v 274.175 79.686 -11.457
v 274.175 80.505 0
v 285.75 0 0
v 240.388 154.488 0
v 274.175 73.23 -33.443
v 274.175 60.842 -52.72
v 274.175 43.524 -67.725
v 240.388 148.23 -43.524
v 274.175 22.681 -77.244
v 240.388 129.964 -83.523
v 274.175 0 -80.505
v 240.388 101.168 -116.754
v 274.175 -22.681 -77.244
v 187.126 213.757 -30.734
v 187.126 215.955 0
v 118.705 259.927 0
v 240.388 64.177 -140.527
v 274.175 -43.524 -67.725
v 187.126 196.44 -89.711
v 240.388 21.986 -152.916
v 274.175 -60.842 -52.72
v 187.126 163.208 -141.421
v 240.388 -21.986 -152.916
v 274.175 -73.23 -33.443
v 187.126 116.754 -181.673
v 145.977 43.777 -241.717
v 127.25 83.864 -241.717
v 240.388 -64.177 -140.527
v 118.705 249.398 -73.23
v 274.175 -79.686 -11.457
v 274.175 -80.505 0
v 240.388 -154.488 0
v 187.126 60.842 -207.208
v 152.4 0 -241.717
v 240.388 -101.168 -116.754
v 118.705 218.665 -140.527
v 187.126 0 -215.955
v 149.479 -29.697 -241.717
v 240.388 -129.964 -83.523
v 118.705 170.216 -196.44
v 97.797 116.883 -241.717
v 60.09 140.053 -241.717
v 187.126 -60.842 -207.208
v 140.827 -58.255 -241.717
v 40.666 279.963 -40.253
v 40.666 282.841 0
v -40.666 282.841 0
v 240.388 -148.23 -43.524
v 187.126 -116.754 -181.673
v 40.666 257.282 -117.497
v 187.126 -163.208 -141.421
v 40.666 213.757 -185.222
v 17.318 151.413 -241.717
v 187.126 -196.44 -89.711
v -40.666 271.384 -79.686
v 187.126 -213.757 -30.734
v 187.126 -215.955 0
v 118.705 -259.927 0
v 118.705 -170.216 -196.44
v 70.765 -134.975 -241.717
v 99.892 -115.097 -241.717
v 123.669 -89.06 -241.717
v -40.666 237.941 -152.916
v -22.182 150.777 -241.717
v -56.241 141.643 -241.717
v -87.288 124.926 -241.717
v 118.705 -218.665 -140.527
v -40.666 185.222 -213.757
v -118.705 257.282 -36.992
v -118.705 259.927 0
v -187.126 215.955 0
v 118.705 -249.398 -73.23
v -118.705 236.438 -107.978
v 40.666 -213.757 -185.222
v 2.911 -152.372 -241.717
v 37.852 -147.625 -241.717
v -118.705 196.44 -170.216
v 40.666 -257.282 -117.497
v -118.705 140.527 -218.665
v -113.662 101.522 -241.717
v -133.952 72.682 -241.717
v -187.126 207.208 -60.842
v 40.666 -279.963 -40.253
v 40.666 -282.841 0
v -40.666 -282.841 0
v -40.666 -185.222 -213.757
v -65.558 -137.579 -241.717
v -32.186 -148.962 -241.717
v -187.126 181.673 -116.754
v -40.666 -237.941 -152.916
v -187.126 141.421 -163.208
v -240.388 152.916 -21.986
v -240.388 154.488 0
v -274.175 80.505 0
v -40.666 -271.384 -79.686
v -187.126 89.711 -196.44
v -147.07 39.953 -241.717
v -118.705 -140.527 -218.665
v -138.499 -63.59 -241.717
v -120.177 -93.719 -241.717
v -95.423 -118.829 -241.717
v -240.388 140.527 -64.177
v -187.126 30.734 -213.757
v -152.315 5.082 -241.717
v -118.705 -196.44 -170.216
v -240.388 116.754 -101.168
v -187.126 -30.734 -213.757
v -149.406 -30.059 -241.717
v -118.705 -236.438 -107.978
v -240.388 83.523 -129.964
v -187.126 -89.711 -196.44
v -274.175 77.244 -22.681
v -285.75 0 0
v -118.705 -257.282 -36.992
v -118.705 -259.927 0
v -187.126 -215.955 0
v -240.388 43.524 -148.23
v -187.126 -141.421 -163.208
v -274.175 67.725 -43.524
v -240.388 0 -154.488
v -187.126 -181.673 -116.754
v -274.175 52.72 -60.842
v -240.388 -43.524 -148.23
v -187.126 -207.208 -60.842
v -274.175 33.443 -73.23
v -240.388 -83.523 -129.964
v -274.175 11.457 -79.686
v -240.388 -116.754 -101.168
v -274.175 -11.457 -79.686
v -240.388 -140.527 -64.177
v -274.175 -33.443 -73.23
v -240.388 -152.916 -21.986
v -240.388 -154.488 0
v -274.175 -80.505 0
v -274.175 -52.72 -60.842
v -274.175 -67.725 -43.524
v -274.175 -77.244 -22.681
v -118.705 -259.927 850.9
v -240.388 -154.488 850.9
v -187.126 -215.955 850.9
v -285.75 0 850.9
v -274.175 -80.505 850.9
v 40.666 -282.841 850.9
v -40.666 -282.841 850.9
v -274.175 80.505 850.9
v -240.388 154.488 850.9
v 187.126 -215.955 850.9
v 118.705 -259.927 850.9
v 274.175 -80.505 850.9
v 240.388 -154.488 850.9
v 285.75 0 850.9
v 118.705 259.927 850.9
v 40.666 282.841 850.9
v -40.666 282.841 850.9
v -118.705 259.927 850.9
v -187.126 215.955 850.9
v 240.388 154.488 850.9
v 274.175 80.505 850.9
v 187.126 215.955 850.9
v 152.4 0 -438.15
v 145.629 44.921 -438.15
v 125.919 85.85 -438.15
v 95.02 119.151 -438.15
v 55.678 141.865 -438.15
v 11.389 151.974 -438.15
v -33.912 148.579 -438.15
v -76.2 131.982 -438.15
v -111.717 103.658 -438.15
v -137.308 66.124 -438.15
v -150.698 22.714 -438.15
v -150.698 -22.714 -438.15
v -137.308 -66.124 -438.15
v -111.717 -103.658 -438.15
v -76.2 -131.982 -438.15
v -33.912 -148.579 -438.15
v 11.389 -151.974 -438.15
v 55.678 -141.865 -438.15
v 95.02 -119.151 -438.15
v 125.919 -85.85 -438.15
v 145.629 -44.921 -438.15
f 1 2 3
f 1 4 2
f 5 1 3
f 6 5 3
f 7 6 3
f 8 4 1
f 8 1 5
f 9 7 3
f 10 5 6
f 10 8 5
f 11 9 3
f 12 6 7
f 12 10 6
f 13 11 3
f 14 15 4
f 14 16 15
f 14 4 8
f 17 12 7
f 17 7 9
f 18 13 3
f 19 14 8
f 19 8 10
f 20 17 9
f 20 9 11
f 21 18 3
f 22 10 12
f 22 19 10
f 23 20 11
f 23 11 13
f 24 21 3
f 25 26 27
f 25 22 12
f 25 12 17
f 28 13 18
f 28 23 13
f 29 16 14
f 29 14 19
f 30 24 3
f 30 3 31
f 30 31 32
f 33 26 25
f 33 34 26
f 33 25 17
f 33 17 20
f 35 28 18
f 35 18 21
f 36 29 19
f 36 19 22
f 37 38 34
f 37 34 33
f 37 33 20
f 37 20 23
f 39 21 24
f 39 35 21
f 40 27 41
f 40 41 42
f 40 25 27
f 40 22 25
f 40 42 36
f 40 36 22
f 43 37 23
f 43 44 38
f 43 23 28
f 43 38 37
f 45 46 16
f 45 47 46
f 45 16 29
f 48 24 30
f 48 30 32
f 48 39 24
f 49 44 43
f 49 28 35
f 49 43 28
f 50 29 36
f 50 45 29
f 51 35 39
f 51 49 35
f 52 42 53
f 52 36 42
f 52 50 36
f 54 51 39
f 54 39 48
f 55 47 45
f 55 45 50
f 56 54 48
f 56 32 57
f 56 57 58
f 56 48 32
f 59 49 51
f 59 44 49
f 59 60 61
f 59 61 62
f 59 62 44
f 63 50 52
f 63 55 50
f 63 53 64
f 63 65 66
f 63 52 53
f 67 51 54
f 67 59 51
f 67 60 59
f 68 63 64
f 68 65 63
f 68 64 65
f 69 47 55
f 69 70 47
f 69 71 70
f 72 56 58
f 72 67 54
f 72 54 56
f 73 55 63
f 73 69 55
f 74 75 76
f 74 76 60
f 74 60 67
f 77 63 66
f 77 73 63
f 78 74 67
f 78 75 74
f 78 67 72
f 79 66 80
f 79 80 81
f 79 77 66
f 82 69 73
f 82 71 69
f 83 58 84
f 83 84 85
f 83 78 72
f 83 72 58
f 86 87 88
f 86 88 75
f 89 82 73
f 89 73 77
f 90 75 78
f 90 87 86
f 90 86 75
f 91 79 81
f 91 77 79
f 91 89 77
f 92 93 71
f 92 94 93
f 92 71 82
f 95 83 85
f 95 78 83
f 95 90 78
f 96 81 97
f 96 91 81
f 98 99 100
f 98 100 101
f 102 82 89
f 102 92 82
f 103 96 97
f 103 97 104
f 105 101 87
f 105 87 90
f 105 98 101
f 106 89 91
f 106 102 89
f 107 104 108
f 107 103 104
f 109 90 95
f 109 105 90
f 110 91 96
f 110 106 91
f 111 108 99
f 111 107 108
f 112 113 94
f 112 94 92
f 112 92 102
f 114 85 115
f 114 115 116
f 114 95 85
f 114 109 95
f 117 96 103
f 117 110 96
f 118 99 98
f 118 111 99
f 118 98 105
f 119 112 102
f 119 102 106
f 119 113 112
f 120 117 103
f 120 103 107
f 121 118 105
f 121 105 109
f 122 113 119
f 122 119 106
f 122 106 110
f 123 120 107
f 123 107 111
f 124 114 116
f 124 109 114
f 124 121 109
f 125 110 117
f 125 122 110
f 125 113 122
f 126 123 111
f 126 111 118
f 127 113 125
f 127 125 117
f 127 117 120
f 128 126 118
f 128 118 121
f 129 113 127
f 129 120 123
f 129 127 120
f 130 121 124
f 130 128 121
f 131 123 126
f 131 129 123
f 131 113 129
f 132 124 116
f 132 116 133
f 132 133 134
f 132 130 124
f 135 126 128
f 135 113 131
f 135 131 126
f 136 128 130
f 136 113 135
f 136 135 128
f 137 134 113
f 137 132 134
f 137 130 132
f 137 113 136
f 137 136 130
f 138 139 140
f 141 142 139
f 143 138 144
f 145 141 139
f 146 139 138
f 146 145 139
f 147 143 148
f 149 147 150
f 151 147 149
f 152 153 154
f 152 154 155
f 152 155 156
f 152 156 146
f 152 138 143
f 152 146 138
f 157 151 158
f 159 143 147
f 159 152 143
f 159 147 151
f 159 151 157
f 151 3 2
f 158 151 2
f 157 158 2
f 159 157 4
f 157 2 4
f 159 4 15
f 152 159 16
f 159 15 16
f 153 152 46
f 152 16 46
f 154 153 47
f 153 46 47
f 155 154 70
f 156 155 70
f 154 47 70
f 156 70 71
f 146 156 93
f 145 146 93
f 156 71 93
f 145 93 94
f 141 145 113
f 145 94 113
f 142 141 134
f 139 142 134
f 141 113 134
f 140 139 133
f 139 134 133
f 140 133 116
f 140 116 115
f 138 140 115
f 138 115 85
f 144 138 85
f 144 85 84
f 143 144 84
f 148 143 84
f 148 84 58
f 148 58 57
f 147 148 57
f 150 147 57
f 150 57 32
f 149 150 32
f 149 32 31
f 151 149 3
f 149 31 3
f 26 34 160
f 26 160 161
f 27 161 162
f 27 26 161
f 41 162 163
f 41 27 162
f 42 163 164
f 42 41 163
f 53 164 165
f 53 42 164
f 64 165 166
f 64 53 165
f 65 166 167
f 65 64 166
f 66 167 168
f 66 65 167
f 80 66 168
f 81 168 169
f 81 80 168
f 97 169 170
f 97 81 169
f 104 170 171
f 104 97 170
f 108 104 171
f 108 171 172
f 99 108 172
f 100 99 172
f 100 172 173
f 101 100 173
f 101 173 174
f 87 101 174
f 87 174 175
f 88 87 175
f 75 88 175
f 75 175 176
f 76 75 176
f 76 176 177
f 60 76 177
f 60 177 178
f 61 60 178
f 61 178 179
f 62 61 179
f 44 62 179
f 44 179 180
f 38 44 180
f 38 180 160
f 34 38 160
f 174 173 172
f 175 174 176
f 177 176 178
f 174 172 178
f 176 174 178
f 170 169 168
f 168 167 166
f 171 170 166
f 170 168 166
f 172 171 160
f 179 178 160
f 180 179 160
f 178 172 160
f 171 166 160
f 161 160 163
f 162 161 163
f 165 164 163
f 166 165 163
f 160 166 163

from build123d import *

# Parameters (mm, degrees)
F1_ANGLE = -180
F2_R     = 152.4
F3_DEPTH = 438.15
F4_R     = 285.75
F5_DEPTH = 850.9


with BuildPart() as f1:
    # F0 (on Top) → F1 (revolve)
    with BuildSketch(Plane.XY):
        with BuildLine():
            Line((0, 0), (285.75, 0))
            ThreePointArc((285.75, 0), (0, 285.75), (-285.75, 0))
            Line((-285.75, 0), (0, 0))
        make_face()
    revolve(axis=Axis((142.875, 0, 0), (1, 0, 0)), revolution_arc=F1_ANGLE)

    # F2 (on face) → F3 (join)
    with BuildSketch(Plane.XY):
        Circle(F2_R)
    extrude(amount=-F3_DEPTH)

    # F4 (on face) → F5 (join)
    with BuildSketch(Plane.XY):
        Circle(F4_R)
    extrude(amount=F5_DEPTH)


solid = f1.part
